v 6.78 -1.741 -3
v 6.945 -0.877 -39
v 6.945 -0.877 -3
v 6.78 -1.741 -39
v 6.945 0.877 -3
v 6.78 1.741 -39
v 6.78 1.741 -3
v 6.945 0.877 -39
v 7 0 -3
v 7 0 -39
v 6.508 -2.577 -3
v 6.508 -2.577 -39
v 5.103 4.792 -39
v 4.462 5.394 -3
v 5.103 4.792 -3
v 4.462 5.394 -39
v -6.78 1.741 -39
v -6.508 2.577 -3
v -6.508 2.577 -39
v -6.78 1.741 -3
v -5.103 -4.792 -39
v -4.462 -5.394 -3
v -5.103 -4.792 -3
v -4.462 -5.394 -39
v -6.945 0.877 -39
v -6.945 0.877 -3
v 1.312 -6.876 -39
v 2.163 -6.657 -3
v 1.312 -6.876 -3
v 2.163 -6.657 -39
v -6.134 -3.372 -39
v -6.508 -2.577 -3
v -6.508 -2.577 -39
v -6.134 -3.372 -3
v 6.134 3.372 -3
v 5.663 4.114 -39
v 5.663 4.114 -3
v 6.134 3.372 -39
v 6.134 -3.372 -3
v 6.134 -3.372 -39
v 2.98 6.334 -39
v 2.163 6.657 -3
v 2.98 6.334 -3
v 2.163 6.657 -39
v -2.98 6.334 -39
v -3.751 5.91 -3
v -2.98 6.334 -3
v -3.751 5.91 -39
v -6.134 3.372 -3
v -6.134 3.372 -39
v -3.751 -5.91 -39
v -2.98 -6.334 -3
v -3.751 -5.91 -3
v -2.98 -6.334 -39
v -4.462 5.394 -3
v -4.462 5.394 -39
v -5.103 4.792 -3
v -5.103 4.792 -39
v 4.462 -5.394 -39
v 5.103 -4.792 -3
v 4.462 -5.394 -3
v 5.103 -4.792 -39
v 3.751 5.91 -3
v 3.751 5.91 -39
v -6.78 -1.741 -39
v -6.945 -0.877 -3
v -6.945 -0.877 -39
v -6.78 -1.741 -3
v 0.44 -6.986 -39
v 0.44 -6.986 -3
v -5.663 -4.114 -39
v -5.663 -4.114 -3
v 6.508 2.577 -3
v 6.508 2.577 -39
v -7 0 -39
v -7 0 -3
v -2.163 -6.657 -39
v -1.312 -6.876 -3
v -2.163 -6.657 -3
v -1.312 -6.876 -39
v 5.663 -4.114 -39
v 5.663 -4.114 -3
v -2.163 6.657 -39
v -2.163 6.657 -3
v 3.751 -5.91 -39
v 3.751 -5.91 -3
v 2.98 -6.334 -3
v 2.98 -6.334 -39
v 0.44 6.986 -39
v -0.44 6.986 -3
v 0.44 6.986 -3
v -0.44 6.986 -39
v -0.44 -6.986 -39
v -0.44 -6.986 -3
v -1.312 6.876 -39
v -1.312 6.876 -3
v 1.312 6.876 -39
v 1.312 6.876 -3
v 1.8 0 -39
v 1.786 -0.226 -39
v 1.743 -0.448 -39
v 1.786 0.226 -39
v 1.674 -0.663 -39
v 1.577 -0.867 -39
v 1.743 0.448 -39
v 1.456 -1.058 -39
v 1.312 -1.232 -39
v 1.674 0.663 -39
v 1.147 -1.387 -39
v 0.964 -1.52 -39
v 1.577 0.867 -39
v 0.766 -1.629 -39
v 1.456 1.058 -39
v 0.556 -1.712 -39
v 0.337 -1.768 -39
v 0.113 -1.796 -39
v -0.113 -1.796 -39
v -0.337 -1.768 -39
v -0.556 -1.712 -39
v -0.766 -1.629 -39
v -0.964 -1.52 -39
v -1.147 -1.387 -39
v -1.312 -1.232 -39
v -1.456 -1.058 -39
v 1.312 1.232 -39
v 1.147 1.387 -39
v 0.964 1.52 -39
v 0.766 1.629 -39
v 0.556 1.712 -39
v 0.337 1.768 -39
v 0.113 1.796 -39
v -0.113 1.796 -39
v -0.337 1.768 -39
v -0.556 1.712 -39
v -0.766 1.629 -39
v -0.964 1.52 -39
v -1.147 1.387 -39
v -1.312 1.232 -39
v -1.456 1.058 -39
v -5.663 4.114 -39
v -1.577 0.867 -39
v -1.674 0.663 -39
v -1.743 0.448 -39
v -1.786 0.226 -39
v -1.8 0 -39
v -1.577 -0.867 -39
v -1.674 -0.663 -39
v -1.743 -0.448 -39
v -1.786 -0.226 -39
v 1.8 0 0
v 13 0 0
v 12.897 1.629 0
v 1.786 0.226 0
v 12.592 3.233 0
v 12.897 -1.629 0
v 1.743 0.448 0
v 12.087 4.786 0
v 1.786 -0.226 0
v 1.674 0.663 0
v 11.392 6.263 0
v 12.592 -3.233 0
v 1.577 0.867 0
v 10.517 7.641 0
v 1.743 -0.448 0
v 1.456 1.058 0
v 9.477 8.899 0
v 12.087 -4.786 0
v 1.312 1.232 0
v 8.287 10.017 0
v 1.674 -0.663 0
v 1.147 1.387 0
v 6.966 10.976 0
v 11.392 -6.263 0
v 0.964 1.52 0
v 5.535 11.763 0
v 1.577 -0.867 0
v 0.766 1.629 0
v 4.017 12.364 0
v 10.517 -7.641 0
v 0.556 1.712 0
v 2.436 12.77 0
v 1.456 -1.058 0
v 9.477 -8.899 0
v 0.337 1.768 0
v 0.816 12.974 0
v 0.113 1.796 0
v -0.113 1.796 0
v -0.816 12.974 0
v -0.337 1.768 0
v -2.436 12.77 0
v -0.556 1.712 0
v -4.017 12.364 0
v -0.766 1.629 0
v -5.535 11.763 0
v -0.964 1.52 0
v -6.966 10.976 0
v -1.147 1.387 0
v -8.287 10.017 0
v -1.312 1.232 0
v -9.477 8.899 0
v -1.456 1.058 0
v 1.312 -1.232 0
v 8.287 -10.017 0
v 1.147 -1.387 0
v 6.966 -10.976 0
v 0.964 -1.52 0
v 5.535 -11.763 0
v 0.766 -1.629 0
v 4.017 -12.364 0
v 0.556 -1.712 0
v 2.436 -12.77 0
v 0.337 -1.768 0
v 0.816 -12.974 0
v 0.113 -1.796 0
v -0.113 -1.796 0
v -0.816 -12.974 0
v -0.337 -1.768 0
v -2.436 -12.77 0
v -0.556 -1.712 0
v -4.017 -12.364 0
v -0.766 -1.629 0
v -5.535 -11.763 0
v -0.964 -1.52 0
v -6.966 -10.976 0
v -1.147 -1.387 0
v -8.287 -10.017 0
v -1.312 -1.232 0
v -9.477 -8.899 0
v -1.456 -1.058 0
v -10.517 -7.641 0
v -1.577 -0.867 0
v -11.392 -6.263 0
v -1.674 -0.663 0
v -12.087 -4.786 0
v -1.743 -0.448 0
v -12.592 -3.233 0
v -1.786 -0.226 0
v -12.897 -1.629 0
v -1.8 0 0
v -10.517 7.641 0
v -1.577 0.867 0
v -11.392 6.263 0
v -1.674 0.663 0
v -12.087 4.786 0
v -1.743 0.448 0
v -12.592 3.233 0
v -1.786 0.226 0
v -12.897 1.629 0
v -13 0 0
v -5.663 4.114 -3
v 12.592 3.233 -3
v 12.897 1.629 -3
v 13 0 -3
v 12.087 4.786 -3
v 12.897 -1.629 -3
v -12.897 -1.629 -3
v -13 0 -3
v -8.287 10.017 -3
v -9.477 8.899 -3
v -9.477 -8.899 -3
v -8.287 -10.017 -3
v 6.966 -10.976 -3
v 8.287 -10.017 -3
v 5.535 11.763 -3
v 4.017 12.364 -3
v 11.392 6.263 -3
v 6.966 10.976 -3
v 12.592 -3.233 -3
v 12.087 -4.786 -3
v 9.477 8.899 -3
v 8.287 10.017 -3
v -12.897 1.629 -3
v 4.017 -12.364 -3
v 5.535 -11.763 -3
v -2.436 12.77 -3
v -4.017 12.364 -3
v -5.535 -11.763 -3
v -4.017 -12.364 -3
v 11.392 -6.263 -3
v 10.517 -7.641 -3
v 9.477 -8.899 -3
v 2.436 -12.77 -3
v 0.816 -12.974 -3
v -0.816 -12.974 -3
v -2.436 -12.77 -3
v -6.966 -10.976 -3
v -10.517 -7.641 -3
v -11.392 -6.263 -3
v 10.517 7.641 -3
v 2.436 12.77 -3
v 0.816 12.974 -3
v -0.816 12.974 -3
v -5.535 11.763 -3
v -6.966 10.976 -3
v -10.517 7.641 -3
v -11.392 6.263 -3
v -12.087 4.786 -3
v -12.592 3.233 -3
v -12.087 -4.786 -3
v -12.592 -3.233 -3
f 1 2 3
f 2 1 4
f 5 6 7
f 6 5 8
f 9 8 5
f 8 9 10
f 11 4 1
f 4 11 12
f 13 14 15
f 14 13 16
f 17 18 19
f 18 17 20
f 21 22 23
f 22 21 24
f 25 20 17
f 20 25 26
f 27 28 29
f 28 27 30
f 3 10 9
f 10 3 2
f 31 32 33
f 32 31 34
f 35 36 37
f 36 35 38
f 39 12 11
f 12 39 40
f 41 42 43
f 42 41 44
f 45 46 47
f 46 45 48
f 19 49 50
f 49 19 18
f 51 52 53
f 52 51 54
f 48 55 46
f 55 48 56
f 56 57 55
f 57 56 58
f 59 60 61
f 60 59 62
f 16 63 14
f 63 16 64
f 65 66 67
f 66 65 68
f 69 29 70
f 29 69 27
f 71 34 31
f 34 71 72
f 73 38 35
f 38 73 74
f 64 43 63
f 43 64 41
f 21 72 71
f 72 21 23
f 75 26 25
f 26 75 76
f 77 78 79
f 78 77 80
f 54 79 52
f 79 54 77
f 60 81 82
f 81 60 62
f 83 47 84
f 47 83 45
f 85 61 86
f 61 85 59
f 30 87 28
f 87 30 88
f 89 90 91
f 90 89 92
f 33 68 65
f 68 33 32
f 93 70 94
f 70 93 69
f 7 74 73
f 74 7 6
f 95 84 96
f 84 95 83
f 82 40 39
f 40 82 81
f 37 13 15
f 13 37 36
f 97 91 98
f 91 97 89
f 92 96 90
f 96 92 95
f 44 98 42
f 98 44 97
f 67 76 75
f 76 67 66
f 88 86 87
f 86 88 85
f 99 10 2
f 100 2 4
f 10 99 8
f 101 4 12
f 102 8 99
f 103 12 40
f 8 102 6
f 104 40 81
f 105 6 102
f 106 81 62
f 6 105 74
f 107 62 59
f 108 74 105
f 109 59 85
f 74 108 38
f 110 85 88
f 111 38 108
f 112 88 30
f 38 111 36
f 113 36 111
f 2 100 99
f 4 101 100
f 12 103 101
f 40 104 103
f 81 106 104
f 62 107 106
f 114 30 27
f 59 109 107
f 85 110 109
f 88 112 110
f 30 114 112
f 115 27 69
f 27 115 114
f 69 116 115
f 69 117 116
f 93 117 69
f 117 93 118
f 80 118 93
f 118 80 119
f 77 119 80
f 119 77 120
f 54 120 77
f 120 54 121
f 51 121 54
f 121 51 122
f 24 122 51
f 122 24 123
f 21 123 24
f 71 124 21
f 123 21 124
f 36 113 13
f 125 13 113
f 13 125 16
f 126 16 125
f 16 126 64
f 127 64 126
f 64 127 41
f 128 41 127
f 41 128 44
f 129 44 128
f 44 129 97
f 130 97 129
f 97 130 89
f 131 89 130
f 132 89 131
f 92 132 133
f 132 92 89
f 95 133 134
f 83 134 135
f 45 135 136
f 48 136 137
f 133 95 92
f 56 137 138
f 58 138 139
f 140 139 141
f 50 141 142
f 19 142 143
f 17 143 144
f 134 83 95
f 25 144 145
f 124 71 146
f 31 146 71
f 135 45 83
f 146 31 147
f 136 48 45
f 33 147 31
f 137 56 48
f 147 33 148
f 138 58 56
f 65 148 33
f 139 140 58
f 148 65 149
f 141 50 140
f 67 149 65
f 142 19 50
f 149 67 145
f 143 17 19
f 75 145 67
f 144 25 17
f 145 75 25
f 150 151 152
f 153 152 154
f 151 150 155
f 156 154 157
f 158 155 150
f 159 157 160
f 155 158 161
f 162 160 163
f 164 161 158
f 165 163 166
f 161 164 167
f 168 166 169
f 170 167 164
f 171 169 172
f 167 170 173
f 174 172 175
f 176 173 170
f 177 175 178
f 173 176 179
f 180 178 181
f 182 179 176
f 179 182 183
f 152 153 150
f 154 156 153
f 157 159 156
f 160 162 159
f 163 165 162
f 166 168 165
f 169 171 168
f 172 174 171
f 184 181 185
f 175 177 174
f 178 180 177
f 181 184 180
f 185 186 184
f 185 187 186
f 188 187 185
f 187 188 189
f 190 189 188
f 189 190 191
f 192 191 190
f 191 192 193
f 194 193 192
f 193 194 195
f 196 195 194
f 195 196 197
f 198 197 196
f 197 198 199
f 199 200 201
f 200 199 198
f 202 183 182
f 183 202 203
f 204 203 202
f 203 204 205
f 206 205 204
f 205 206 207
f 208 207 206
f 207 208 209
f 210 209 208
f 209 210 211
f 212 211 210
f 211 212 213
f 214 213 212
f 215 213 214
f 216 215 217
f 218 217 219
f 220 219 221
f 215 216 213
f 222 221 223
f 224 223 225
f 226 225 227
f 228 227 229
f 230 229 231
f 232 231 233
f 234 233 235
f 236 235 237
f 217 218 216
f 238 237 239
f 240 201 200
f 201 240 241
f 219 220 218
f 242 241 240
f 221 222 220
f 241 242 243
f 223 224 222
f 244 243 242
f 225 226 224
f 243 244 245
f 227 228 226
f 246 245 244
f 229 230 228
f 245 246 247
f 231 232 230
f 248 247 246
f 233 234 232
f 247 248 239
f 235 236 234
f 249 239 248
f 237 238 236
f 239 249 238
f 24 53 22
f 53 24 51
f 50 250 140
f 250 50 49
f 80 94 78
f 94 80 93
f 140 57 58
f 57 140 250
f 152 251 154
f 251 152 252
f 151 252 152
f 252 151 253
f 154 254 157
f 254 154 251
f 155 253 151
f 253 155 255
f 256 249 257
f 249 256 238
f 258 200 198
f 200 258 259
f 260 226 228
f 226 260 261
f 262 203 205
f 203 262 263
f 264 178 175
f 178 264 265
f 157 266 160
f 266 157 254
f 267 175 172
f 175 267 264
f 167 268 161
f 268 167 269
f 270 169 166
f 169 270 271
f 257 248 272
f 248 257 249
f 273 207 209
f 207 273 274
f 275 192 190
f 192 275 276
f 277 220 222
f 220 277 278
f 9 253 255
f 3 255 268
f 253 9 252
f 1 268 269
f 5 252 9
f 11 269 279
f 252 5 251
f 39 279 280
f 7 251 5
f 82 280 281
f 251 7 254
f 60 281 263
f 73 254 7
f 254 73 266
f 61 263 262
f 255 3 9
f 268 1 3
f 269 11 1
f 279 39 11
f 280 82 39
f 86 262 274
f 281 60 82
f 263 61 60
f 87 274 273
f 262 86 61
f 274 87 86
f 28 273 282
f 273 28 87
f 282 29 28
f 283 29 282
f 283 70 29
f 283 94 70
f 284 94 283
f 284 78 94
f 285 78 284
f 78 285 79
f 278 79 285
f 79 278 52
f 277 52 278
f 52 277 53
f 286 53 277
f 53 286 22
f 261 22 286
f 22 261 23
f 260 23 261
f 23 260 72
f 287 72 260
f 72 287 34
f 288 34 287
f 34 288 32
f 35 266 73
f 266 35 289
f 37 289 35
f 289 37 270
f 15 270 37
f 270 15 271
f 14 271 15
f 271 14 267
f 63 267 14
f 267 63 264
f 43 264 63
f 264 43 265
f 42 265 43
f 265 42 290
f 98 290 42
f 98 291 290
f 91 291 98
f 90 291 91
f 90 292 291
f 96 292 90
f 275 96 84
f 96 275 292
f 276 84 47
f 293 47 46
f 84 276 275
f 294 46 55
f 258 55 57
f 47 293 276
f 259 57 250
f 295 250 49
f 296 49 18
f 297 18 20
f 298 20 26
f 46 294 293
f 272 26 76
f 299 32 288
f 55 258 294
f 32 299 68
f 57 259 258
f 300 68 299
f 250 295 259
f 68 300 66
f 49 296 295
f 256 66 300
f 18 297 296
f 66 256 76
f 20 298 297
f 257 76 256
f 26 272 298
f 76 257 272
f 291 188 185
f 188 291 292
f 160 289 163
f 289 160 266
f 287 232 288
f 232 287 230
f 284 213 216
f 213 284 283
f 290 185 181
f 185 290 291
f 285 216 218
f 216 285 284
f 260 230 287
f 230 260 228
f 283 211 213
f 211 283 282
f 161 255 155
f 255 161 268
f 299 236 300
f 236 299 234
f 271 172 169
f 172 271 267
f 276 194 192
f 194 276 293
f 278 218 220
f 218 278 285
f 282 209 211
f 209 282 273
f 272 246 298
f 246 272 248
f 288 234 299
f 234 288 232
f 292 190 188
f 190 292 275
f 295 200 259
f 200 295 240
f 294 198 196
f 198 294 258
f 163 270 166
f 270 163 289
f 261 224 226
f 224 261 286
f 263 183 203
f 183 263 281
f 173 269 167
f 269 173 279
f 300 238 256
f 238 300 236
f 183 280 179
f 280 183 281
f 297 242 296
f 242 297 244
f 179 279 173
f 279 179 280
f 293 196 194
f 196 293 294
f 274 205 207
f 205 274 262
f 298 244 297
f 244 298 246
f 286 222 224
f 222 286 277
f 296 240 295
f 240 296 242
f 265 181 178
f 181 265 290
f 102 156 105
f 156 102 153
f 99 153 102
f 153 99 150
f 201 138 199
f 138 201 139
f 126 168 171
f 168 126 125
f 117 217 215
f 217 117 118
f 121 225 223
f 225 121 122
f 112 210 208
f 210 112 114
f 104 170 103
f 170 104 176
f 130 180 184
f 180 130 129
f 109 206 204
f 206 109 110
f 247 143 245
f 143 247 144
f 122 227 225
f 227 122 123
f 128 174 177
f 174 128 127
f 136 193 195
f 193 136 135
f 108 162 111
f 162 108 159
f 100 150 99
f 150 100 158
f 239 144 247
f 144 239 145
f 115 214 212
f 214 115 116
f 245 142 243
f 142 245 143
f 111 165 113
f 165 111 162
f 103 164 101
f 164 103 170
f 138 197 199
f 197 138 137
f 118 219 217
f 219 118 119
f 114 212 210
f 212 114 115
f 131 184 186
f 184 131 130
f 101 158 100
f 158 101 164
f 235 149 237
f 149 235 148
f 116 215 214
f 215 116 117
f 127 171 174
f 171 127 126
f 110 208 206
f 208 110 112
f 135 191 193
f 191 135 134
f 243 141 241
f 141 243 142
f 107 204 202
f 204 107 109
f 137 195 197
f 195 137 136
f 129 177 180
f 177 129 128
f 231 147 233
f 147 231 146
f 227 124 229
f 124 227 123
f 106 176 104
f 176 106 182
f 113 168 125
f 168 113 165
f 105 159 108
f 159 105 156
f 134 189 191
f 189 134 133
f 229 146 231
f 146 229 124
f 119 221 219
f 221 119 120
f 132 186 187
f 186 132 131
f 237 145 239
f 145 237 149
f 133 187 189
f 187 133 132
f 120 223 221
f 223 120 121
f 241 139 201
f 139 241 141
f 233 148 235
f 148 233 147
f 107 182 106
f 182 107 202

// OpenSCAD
$fn = 50;


difference() {
	union() {
		translate(v = [0, 0, -39.0000000000]) {
			cylinder(h = 39, r = 7.0000000000);
		}
		translate(v = [0, 0, -3.0000000000]) {
			cylinder(h = 3, r = 13.0000000000);
		}
	}
	union() {
		#translate(v = [0, 0, -39]) {
			cylinder(h = 39, r = 1.8000000000);
		}
	}
}
